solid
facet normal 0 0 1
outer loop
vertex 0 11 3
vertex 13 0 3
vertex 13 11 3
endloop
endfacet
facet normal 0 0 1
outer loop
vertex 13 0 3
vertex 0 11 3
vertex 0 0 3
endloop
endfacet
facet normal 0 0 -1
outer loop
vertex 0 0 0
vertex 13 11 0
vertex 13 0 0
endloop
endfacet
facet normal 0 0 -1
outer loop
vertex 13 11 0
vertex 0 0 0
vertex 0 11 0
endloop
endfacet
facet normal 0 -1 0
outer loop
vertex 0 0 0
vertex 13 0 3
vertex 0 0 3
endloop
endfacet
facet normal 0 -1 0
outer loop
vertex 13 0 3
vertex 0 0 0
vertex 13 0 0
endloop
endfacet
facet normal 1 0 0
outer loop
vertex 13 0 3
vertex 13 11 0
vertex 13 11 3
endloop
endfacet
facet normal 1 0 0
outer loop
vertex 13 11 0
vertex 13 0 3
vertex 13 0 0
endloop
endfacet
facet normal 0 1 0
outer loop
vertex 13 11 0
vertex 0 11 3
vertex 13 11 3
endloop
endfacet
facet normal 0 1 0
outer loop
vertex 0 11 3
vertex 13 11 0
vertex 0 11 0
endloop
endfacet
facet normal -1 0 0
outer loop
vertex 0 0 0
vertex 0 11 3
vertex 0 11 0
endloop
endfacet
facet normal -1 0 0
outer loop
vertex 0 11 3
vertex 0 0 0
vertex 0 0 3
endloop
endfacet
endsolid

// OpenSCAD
// Generated by SolidPython 1.0.1 on 2020-07-29 00:46:55


cube(size = [13, 11, 3]);
/***********************************************
*********      SolidPython code:      **********
************************************************
 
# import packages: SolidPython
from solid import *
from solid.utils import *
from itertools import chain, combinations, permutations


class Resize:

    def __init__(self, scad_file):
        self.scad_file = scad_file
        #self.scad_file = import_scad(scad_file)
        # cone/cylinder param:
        self.r1 = 0
        self.r2 = 0
        self.h = 0
        # rectangular prism param:
        self.w = 0
        self.l = 0
        # ellipse param:
        self.r = 0

    # import OpenScad code (file name corresponds to shape)


    # classify shape + parameters
    def assign(self, param1, param2, param3):
        if self.scad_file == 'cone.scad':
            self.r1 = param1
            self.r2 = param2
            self.h = param3
        elif self.scad_file == 'cylinder.scad':
            self.r1 = param1
            self.r2 = param2
            self.h = param3
        elif self.scad_file == 'rectangularPrism.scad':
            self.h = param1
            self.l = param2
            self.w = param3
        else:
            self.r = param1
            self.h = param2

    # resize parameters
    def iterate(self):
        x = range(3, 20, 2)
        i = 1
        if self.scad_file == 'cone.scad':
            tempList = list(permutations(x, 2))
            for temp in tempList:
                param1 = temp[0]
                param2 = temp[1]
                filepath = 'produced_scad_files/' + 'cone' + str(param1) + '_' + str(param2) + '_' + '.scad'
                scad_render_to_file(cylinder(h=param1, r1=param2, r2=0), filepath)

        elif self.scad_file == 'cylinder.scad':
            tempList = list(permutations(x, 3))
            for temp in tempList:
                param1 = temp[0]
                param2 = temp[1]
                filepath = 'produced_scad_files/' + 'cylinder' + str(param1) + '_' + str(param2) + '_' + '.scad'
                scad_render_to_file(cylinder(h=param1, r1=param2, r2=param2), filepath)

        elif self.scad_file == 'rectangularPrism.scad':
            tempList = list(permutations(x, 3))
            for temp in tempList:
                param1 = temp[0]
                param2 = temp[1]
                param3 = temp[2]
                filepath = 'produced_scad_files/' + 'rectangularPrism' + str(param1) + '_' + str(param2) + '_' + str(
                    param3) + '.scad'
                scad_render_to_file(cube(size=(param1, param2, param3)), filepath)

        elif self.scad_file == 'ellipse.scad':
            tempList = list(permutations(x, 4))
            for temp in tempList:
                param1 = temp[0]
                param2 = temp[1]
                param3 = temp[2]
                param4 = temp[3]
                filepath = 'produced_scad_files/' + 'ellipse' + str(param1) + '_' + str(param2) + '_' + str(param3) + '_' + str(param4) + '.scad'
                scad_render_to_file(scale([param1, param2, param3])(sphere(r=param4)), filepath)

    def render_to_scadfile(self):
        scad_render_to_file(scad, 'example.scad') 
 
************************************************/
